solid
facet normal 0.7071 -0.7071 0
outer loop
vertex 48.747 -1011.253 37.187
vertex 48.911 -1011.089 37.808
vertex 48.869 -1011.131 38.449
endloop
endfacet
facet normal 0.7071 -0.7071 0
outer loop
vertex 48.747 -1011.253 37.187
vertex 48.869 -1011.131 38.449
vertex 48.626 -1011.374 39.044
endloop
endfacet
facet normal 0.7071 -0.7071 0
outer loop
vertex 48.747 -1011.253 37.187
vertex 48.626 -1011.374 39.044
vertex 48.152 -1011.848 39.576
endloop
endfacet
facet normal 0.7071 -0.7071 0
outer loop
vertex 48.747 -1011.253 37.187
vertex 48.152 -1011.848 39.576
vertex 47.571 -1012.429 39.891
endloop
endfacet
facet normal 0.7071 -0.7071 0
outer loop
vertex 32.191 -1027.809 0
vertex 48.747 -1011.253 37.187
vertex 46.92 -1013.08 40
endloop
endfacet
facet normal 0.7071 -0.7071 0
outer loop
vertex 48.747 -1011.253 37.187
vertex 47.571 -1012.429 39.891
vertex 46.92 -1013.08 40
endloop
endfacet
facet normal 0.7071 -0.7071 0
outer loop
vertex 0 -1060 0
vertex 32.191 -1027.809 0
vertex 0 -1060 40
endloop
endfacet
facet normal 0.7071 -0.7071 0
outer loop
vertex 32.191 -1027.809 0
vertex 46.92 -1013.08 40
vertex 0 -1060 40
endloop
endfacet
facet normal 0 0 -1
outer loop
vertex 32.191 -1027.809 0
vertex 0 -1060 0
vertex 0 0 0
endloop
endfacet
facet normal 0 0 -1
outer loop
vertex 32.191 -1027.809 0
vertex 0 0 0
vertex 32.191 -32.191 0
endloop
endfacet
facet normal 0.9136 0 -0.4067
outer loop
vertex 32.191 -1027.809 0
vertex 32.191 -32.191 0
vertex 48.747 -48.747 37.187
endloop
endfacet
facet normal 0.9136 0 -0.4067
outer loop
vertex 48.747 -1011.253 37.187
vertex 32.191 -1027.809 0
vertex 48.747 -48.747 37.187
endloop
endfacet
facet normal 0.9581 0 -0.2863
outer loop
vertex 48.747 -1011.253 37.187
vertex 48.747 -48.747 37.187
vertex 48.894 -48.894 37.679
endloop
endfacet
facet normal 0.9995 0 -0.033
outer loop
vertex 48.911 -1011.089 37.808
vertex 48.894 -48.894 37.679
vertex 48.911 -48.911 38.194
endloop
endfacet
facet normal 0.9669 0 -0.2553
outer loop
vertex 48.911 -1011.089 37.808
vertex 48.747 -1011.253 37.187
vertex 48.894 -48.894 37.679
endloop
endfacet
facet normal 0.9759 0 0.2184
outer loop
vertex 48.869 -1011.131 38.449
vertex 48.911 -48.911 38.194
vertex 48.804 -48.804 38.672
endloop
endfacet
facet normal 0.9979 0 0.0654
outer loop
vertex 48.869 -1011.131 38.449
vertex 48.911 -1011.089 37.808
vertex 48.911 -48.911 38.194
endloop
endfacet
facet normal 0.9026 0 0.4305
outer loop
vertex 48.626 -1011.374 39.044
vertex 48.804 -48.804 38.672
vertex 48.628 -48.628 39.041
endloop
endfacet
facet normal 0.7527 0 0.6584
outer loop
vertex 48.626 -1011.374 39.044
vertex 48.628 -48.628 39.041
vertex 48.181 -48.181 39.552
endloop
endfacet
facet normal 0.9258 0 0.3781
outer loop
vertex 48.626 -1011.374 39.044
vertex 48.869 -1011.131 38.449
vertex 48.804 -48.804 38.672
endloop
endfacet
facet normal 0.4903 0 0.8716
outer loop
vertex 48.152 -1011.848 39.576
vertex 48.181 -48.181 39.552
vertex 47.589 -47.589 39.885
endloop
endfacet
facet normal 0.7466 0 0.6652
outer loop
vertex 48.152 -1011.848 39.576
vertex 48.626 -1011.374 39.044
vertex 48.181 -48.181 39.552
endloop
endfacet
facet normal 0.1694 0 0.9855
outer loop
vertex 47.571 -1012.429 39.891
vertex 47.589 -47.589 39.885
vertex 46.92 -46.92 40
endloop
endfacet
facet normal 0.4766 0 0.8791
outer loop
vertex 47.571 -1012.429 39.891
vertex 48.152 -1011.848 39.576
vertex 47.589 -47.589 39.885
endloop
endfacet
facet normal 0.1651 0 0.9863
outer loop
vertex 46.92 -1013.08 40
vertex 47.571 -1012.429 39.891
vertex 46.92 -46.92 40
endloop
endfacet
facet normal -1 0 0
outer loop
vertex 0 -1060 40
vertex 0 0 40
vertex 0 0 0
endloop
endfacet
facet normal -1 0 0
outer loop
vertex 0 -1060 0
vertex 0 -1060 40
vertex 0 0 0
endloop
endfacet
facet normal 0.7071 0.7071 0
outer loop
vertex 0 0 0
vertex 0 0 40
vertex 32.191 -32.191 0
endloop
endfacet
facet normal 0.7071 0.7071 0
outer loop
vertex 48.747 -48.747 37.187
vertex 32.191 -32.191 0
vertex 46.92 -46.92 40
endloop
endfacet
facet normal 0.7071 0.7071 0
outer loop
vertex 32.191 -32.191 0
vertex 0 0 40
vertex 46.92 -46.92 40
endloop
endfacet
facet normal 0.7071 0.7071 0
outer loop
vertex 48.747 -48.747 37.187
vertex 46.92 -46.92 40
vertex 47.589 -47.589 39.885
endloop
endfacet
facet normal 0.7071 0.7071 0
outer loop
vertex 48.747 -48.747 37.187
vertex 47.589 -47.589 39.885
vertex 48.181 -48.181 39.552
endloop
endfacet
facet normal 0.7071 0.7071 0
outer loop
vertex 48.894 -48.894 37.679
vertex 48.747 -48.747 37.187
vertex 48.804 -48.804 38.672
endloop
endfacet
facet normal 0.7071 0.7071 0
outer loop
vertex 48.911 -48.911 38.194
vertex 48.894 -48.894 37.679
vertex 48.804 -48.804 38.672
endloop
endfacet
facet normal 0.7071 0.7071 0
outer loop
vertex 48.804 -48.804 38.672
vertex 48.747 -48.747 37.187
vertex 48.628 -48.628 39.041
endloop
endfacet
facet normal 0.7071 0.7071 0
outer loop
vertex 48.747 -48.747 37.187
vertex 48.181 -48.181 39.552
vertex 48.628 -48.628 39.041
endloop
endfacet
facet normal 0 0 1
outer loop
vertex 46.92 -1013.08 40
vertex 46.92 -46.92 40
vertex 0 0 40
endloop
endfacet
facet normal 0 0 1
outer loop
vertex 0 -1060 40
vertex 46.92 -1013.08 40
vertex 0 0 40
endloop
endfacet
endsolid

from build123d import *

# Parameters (mm, degrees)
F1_DEPTH = 1060
F2_R     = 2
F4_DEPTH = 40.001


with BuildPart() as f1:
    # F0 (on Front) → F1 (new body)
    with BuildSketch(Plane.XZ):
        Polygon((0, 40), (0, 0), (32.190853, 0), (50, 40), align=None)
    extrude(amount=F1_DEPTH)

    # F2
    f2_edges = [f1.edges().sort_by_distance(p)[0] for p in [
        (50, -530, 40),
    ]]
    fillet(f2_edges, radius=F2_R)

    # F3 (on face) → F4 (cut, through all)
    with BuildSketch(Plane.XY.offset(40)):
        Polygon((49.361777, 0), (0, 0), (49.361777, -49.361777), align=None)
        Polygon((60.1357, -999.8643), (0, -1060), (60.1357, -1060), align=None)
    extrude(amount=-F4_DEPTH, mode=Mode.SUBTRACT)


solid = f1.part
